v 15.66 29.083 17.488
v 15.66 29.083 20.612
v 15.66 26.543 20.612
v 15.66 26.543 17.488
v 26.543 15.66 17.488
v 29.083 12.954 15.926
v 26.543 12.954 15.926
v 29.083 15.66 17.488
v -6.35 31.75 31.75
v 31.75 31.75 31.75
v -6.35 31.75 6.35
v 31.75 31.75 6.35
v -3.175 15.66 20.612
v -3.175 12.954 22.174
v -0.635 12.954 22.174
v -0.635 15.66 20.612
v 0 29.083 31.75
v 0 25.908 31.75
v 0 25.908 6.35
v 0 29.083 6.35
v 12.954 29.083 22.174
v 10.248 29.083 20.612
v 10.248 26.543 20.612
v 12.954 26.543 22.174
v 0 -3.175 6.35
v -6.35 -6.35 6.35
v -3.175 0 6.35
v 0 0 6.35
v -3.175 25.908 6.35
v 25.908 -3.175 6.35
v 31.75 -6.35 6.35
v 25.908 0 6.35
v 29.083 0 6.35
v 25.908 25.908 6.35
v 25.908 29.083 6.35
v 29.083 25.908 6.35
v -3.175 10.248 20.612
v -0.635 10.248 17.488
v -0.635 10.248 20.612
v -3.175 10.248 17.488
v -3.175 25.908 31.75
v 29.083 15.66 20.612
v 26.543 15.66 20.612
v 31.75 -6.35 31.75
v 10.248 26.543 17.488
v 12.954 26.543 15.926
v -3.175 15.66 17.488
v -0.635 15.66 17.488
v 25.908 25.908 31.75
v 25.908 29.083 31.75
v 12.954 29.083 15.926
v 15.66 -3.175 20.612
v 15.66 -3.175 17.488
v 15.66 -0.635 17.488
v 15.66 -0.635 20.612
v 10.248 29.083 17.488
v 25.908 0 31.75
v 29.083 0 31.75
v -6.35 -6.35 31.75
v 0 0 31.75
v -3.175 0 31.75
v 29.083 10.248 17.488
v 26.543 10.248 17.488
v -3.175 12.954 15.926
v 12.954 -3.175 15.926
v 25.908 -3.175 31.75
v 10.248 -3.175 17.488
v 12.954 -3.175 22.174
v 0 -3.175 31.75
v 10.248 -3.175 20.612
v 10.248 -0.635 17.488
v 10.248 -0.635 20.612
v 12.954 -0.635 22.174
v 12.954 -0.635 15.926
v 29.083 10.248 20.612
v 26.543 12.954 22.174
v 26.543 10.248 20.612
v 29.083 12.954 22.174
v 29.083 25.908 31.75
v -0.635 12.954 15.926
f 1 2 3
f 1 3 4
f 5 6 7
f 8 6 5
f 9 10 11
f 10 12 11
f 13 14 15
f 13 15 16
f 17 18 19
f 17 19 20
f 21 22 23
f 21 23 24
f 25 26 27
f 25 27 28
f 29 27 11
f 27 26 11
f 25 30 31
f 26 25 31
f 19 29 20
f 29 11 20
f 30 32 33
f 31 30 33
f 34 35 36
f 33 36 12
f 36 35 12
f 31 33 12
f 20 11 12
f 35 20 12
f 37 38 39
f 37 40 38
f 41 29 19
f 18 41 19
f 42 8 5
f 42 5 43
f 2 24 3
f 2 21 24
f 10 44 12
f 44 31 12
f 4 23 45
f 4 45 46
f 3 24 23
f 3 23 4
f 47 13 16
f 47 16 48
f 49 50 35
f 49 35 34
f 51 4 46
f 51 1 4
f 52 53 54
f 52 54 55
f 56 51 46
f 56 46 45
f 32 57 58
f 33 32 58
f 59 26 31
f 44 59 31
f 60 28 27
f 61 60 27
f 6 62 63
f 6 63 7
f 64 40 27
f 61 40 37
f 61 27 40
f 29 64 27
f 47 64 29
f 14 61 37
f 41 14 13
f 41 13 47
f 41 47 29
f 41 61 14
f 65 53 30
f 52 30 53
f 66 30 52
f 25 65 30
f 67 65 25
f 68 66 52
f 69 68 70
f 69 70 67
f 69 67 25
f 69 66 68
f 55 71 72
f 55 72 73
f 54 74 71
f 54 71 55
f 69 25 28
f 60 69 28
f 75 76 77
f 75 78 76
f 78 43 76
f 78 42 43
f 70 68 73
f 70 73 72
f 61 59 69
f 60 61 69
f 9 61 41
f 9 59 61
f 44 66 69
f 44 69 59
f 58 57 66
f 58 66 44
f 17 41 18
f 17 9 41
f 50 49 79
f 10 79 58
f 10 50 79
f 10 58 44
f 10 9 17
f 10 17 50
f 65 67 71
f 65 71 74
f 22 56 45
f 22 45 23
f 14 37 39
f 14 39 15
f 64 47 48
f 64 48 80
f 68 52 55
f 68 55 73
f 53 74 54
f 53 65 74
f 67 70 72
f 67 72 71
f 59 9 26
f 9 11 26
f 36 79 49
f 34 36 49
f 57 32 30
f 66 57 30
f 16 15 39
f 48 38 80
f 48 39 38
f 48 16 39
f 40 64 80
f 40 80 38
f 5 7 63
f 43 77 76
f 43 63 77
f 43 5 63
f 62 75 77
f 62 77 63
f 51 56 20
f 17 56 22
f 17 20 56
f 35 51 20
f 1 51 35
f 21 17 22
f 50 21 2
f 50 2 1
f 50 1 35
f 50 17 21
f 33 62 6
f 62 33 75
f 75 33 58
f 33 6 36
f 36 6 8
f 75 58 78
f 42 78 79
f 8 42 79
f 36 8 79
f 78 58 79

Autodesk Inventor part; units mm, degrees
ref_plane "YZ Plane" through (0, 0, 0) normal (1, 0, 0) x (0, 1, 0)
ref_plane "XZ Plane" through (0, 0, 0) normal (0, 1, 0) x (-1, 0, 0)
ref_plane "XY Plane" through (0, 0, 0) normal (0, 0, 1) x (1, 0, 0)
sketch "Sketch1" plane through (0, 0, 0) normal (0, 0, 1) x (1, 0, 0)
  line L0 (0, 0) -> (25.908, 0)
  line L1 (25.908, 0) -> (25.908, 25.908)
  line L2 (25.908, 25.908) -> (0, 25.908)
  line L3 (0, 25.908) -> (0, 0)
  line L4 (-6.35, 0) -> (-6.35, -6.35)
  line L5 (-6.35, -6.35) -> (0, -6.35)
  line L6 (-6.35, -6.35) -> (31.75, -6.35)
  line L7 (31.75, -6.35) -> (31.75, 31.75)
  line L8 (31.75, 31.75) -> (-6.35, 31.75)
  line L9 (-6.35, 31.75) -> (-6.35, -6.35)
  dimension "d0" = 25.908
  dimension "d1" = 25.908
  dimension "d4" = 38.1
  dimension "d5" = 38.1
extrude "Extrusion1" add sketch "Sketch1" along normal blind 38.1
sketch "Sketch2" plane through (-6.35, 31.75, 0) normal (0, 1, 0) x (1, 0, 0)
  line L0 (0, -38.1) -> (38.1, -38.1) projected
  line L1 (38.1, 0) -> (38.1, -38.1) projected
  line L2 (38.1, 0) -> (0, 0) projected
  line L3 (0, 0) -> (0, -38.1) projected
  line L4 (0, -38.1) -> (0, -19.05)
  line L5 (0, 0) -> (0, -38.1) projected
  point P0 (6.35, 0)
sketch "Sketch3" plane through (-6.35, 31.75, 0) normal (0, 1, 0) x (1, 0, 0)
  line L0 (0, -38.1) -> (38.1, -38.1) projected
  line L1 (38.1, 0) -> (38.1, -38.1) projected
  line L2 (38.1, 0) -> (0, 0) projected
  line L3 (0, 0) -> (0, -38.1) projected
  point P0 (6.35, 0)
  point P1 (38.1, -19.05)
sketch "Sketch4" plane through (0, 0, 38.1) normal (0, 0, 1) x (1, 0, 0)
  line L0 (0, 0) -> (25.908, 0)
  line L1 (25.908, 0) -> (25.908, -3.175)
  line L2 (25.908, -3.175) -> (0, -3.175)
  line L3 (0, -3.175) -> (0, 0)
  line L4 (25.908, 0) -> (29.083, 0)
  line L5 (29.083, 0) -> (29.083, 25.908)
  line L6 (29.083, 25.908) -> (25.908, 25.908)
  line L7 (25.908, 25.908) -> (25.908, 0)
  line L8 (25.908, 25.908) -> (0, 25.908)
  line L9 (0, 25.908) -> (0, 29.083)
  line L10 (0, 29.083) -> (25.908, 29.083)
  line L11 (25.908, 29.083) -> (25.908, 25.908)
  line L12 (0, 0) -> (-3.175, 0)
  line L13 (-3.175, 0) -> (-3.175, 25.908)
  line L14 (-3.175, 25.908) -> (0, 25.908)
  line L15 (0, 25.908) -> (0, 0)
  dimension "d8" = 3.175
  dimension "d9" = 3.175
  dimension "d10" = 3.175
  dimension "d11" = 3.175
extrude "Extrusion2" cut sketch "Sketch4" against normal blind 38.1 contours L0 L1 L2 L3 | L12 L13 L14 L15 | L7 L6 L5 L4 | L9 L10 L11 L8
sketch "Sketch5" plane through (0, 29.083, 38.1) normal (0, -1, 0) x (1, 0, 0)
  line L0 (0, 0) -> (0, -38.1) projected
  line L1 (0, 0) -> (0, -19.05)
  line L2 (0, -19.05) -> (12.954, -19.05)
  line L3 (25.908, 0) -> (25.908, -38.1) projected
  line L4 (12.954, -19.05) -> (12.954, -15.9258)
  line L5 (12.954, -15.9258) -> (15.6596, -17.4879)
  line L6 (15.6596, -17.4879) -> (15.6596, -20.6121)
  line L7 (15.6596, -20.6121) -> (12.954, -22.1742)
  line L8 (12.954, -22.1742) -> (10.2484, -20.6121)
  line L9 (10.2484, -20.6121) -> (10.2484, -17.4879)
  line L10 (10.2484, -17.4879) -> (12.954, -15.9258)
  dimension "d14" = 19.05
  dimension "d22" = 3.1242
extrude "Extrusion3" add sketch "Sketch5" along normal blind 2.54
sketch "Sketch6" plane through (-3.175, 0, 38.1) normal (1, 0, 0) x (0, 0, -1)
  line L0 (38.1, 25.908) -> (38.1, 0) projected
  line L1 (38.1, 0) -> (38.1, 12.954)
  line L2 (38.1, 12.954) -> (19.05, 12.954)
  line L3 (19.05, 12.954) -> (22.1742, 12.954)
  line L4 (22.1742, 12.954) -> (20.6121, 10.2484)
  line L5 (20.6121, 10.2484) -> (17.4879, 10.2484)
  line L6 (17.4879, 10.2484) -> (15.9258, 12.954)
  line L7 (15.9258, 12.954) -> (17.4879, 15.6596)
  line L8 (17.4879, 15.6596) -> (20.6121, 15.6596)
  line L9 (20.6121, 15.6596) -> (22.1742, 12.954)
  dimension "d19" = 12.954
  dimension "d20" = 19.05
  dimension "d23" = 3.1242
extrude "Extrusion4" add sketch "Sketch6" along normal blind 2.54
sketch "Sketch7" plane through (0, -3.175, 38.1) normal (0, 1, 0) x (1, 0, 0)
  line L0 (0, 0) -> (0, 38.1) projected
  line L1 (0, 0) -> (0, 19.05)
  line L2 (0, 19.05) -> (12.954, 19.05)
  line L3 (12.954, 19.05) -> (12.954, 15.9258)
  line L4 (12.954, 15.9258) -> (10.2484, 17.4879)
  line L5 (10.2484, 17.4879) -> (10.2484, 20.6121)
  line L6 (10.2484, 20.6121) -> (12.954, 22.1742)
  line L7 (12.954, 22.1742) -> (15.6596, 20.6121)
  line L8 (15.6596, 20.6121) -> (15.6596, 17.4879)
  line L9 (15.6596, 17.4879) -> (12.954, 15.9258)
  dimension "d26" = 19.05
  dimension "d27" = 12.954
  dimension "d28" = 3.1242
extrude "Extrusion5" add sketch "Sketch7" along normal blind 2.54
sketch "Sketch8" plane through (29.083, 0, 38.1) normal (-1, 0, 0) x (0, 0, 1)
  line L0 (0, 0) -> (-19.05, 0)
  line L1 (-38.1, 0) -> (0, 0) projected
  line L2 (-19.05, 0) -> (-19.05, 12.954)
  line L3 (-19.05, 12.954) -> (-15.9258, 12.954)
  line L4 (-15.9258, 12.954) -> (-17.4879, 10.2484)
  line L5 (-17.4879, 10.2484) -> (-20.6121, 10.2484)
  line L6 (-20.6121, 10.2484) -> (-22.1742, 12.954)
  line L7 (-22.1742, 12.954) -> (-20.6121, 15.6596)
  line L8 (-20.6121, 15.6596) -> (-17.4879, 15.6596)
  line L9 (-17.4879, 15.6596) -> (-15.9258, 12.954)
  dimension "d31" = 19.05
  dimension "d32" = 12.954
  dimension "d33" = 3.1242
extrude "Extrusion6" add sketch "Sketch8" along normal blind 2.54
sketch "Sketch9" plane through (0, 0, 38.1) normal (0, 0, 1) x (1, 0, 0)
  line L0 (0, 25.908) -> (0, 29.083) projected
  line L1 (0, 29.083) -> (25.908, 29.083) projected
  line L2 (25.908, 29.083) -> (25.908, 25.908) projected
  line L3 (25.908, 25.908) -> (29.083, 25.908) projected
  line L4 (29.083, 25.908) -> (29.083, 0) projected
  line L5 (29.083, 0) -> (25.908, 0) projected
  line L6 (25.908, 0) -> (25.908, -3.175) projected
  line L7 (25.908, -3.175) -> (0, -3.175) projected
  line L8 (0, -3.175) -> (0, 0) projected
  line L9 (0, 0) -> (-3.175, 0) projected
  line L10 (-3.175, 0) -> (-3.175, 25.908) projected
  line L11 (-3.175, 25.908) -> (0, 25.908) projected
  line L12 (-6.35, -6.35) -> (-6.35, 31.75) projected
  line L13 (31.75, -6.35) -> (-6.35, -6.35) projected
  line L14 (31.75, 31.75) -> (31.75, -6.35) projected
  line L15 (-6.35, 31.75) -> (31.75, 31.75) projected
extrude "Extrusion7" cut sketch "Sketch9" against normal blind 6.35
extrude "Extrusion8" cut sketch "Sketch1" along normal blind 6.35
properties part number "freeholder"
